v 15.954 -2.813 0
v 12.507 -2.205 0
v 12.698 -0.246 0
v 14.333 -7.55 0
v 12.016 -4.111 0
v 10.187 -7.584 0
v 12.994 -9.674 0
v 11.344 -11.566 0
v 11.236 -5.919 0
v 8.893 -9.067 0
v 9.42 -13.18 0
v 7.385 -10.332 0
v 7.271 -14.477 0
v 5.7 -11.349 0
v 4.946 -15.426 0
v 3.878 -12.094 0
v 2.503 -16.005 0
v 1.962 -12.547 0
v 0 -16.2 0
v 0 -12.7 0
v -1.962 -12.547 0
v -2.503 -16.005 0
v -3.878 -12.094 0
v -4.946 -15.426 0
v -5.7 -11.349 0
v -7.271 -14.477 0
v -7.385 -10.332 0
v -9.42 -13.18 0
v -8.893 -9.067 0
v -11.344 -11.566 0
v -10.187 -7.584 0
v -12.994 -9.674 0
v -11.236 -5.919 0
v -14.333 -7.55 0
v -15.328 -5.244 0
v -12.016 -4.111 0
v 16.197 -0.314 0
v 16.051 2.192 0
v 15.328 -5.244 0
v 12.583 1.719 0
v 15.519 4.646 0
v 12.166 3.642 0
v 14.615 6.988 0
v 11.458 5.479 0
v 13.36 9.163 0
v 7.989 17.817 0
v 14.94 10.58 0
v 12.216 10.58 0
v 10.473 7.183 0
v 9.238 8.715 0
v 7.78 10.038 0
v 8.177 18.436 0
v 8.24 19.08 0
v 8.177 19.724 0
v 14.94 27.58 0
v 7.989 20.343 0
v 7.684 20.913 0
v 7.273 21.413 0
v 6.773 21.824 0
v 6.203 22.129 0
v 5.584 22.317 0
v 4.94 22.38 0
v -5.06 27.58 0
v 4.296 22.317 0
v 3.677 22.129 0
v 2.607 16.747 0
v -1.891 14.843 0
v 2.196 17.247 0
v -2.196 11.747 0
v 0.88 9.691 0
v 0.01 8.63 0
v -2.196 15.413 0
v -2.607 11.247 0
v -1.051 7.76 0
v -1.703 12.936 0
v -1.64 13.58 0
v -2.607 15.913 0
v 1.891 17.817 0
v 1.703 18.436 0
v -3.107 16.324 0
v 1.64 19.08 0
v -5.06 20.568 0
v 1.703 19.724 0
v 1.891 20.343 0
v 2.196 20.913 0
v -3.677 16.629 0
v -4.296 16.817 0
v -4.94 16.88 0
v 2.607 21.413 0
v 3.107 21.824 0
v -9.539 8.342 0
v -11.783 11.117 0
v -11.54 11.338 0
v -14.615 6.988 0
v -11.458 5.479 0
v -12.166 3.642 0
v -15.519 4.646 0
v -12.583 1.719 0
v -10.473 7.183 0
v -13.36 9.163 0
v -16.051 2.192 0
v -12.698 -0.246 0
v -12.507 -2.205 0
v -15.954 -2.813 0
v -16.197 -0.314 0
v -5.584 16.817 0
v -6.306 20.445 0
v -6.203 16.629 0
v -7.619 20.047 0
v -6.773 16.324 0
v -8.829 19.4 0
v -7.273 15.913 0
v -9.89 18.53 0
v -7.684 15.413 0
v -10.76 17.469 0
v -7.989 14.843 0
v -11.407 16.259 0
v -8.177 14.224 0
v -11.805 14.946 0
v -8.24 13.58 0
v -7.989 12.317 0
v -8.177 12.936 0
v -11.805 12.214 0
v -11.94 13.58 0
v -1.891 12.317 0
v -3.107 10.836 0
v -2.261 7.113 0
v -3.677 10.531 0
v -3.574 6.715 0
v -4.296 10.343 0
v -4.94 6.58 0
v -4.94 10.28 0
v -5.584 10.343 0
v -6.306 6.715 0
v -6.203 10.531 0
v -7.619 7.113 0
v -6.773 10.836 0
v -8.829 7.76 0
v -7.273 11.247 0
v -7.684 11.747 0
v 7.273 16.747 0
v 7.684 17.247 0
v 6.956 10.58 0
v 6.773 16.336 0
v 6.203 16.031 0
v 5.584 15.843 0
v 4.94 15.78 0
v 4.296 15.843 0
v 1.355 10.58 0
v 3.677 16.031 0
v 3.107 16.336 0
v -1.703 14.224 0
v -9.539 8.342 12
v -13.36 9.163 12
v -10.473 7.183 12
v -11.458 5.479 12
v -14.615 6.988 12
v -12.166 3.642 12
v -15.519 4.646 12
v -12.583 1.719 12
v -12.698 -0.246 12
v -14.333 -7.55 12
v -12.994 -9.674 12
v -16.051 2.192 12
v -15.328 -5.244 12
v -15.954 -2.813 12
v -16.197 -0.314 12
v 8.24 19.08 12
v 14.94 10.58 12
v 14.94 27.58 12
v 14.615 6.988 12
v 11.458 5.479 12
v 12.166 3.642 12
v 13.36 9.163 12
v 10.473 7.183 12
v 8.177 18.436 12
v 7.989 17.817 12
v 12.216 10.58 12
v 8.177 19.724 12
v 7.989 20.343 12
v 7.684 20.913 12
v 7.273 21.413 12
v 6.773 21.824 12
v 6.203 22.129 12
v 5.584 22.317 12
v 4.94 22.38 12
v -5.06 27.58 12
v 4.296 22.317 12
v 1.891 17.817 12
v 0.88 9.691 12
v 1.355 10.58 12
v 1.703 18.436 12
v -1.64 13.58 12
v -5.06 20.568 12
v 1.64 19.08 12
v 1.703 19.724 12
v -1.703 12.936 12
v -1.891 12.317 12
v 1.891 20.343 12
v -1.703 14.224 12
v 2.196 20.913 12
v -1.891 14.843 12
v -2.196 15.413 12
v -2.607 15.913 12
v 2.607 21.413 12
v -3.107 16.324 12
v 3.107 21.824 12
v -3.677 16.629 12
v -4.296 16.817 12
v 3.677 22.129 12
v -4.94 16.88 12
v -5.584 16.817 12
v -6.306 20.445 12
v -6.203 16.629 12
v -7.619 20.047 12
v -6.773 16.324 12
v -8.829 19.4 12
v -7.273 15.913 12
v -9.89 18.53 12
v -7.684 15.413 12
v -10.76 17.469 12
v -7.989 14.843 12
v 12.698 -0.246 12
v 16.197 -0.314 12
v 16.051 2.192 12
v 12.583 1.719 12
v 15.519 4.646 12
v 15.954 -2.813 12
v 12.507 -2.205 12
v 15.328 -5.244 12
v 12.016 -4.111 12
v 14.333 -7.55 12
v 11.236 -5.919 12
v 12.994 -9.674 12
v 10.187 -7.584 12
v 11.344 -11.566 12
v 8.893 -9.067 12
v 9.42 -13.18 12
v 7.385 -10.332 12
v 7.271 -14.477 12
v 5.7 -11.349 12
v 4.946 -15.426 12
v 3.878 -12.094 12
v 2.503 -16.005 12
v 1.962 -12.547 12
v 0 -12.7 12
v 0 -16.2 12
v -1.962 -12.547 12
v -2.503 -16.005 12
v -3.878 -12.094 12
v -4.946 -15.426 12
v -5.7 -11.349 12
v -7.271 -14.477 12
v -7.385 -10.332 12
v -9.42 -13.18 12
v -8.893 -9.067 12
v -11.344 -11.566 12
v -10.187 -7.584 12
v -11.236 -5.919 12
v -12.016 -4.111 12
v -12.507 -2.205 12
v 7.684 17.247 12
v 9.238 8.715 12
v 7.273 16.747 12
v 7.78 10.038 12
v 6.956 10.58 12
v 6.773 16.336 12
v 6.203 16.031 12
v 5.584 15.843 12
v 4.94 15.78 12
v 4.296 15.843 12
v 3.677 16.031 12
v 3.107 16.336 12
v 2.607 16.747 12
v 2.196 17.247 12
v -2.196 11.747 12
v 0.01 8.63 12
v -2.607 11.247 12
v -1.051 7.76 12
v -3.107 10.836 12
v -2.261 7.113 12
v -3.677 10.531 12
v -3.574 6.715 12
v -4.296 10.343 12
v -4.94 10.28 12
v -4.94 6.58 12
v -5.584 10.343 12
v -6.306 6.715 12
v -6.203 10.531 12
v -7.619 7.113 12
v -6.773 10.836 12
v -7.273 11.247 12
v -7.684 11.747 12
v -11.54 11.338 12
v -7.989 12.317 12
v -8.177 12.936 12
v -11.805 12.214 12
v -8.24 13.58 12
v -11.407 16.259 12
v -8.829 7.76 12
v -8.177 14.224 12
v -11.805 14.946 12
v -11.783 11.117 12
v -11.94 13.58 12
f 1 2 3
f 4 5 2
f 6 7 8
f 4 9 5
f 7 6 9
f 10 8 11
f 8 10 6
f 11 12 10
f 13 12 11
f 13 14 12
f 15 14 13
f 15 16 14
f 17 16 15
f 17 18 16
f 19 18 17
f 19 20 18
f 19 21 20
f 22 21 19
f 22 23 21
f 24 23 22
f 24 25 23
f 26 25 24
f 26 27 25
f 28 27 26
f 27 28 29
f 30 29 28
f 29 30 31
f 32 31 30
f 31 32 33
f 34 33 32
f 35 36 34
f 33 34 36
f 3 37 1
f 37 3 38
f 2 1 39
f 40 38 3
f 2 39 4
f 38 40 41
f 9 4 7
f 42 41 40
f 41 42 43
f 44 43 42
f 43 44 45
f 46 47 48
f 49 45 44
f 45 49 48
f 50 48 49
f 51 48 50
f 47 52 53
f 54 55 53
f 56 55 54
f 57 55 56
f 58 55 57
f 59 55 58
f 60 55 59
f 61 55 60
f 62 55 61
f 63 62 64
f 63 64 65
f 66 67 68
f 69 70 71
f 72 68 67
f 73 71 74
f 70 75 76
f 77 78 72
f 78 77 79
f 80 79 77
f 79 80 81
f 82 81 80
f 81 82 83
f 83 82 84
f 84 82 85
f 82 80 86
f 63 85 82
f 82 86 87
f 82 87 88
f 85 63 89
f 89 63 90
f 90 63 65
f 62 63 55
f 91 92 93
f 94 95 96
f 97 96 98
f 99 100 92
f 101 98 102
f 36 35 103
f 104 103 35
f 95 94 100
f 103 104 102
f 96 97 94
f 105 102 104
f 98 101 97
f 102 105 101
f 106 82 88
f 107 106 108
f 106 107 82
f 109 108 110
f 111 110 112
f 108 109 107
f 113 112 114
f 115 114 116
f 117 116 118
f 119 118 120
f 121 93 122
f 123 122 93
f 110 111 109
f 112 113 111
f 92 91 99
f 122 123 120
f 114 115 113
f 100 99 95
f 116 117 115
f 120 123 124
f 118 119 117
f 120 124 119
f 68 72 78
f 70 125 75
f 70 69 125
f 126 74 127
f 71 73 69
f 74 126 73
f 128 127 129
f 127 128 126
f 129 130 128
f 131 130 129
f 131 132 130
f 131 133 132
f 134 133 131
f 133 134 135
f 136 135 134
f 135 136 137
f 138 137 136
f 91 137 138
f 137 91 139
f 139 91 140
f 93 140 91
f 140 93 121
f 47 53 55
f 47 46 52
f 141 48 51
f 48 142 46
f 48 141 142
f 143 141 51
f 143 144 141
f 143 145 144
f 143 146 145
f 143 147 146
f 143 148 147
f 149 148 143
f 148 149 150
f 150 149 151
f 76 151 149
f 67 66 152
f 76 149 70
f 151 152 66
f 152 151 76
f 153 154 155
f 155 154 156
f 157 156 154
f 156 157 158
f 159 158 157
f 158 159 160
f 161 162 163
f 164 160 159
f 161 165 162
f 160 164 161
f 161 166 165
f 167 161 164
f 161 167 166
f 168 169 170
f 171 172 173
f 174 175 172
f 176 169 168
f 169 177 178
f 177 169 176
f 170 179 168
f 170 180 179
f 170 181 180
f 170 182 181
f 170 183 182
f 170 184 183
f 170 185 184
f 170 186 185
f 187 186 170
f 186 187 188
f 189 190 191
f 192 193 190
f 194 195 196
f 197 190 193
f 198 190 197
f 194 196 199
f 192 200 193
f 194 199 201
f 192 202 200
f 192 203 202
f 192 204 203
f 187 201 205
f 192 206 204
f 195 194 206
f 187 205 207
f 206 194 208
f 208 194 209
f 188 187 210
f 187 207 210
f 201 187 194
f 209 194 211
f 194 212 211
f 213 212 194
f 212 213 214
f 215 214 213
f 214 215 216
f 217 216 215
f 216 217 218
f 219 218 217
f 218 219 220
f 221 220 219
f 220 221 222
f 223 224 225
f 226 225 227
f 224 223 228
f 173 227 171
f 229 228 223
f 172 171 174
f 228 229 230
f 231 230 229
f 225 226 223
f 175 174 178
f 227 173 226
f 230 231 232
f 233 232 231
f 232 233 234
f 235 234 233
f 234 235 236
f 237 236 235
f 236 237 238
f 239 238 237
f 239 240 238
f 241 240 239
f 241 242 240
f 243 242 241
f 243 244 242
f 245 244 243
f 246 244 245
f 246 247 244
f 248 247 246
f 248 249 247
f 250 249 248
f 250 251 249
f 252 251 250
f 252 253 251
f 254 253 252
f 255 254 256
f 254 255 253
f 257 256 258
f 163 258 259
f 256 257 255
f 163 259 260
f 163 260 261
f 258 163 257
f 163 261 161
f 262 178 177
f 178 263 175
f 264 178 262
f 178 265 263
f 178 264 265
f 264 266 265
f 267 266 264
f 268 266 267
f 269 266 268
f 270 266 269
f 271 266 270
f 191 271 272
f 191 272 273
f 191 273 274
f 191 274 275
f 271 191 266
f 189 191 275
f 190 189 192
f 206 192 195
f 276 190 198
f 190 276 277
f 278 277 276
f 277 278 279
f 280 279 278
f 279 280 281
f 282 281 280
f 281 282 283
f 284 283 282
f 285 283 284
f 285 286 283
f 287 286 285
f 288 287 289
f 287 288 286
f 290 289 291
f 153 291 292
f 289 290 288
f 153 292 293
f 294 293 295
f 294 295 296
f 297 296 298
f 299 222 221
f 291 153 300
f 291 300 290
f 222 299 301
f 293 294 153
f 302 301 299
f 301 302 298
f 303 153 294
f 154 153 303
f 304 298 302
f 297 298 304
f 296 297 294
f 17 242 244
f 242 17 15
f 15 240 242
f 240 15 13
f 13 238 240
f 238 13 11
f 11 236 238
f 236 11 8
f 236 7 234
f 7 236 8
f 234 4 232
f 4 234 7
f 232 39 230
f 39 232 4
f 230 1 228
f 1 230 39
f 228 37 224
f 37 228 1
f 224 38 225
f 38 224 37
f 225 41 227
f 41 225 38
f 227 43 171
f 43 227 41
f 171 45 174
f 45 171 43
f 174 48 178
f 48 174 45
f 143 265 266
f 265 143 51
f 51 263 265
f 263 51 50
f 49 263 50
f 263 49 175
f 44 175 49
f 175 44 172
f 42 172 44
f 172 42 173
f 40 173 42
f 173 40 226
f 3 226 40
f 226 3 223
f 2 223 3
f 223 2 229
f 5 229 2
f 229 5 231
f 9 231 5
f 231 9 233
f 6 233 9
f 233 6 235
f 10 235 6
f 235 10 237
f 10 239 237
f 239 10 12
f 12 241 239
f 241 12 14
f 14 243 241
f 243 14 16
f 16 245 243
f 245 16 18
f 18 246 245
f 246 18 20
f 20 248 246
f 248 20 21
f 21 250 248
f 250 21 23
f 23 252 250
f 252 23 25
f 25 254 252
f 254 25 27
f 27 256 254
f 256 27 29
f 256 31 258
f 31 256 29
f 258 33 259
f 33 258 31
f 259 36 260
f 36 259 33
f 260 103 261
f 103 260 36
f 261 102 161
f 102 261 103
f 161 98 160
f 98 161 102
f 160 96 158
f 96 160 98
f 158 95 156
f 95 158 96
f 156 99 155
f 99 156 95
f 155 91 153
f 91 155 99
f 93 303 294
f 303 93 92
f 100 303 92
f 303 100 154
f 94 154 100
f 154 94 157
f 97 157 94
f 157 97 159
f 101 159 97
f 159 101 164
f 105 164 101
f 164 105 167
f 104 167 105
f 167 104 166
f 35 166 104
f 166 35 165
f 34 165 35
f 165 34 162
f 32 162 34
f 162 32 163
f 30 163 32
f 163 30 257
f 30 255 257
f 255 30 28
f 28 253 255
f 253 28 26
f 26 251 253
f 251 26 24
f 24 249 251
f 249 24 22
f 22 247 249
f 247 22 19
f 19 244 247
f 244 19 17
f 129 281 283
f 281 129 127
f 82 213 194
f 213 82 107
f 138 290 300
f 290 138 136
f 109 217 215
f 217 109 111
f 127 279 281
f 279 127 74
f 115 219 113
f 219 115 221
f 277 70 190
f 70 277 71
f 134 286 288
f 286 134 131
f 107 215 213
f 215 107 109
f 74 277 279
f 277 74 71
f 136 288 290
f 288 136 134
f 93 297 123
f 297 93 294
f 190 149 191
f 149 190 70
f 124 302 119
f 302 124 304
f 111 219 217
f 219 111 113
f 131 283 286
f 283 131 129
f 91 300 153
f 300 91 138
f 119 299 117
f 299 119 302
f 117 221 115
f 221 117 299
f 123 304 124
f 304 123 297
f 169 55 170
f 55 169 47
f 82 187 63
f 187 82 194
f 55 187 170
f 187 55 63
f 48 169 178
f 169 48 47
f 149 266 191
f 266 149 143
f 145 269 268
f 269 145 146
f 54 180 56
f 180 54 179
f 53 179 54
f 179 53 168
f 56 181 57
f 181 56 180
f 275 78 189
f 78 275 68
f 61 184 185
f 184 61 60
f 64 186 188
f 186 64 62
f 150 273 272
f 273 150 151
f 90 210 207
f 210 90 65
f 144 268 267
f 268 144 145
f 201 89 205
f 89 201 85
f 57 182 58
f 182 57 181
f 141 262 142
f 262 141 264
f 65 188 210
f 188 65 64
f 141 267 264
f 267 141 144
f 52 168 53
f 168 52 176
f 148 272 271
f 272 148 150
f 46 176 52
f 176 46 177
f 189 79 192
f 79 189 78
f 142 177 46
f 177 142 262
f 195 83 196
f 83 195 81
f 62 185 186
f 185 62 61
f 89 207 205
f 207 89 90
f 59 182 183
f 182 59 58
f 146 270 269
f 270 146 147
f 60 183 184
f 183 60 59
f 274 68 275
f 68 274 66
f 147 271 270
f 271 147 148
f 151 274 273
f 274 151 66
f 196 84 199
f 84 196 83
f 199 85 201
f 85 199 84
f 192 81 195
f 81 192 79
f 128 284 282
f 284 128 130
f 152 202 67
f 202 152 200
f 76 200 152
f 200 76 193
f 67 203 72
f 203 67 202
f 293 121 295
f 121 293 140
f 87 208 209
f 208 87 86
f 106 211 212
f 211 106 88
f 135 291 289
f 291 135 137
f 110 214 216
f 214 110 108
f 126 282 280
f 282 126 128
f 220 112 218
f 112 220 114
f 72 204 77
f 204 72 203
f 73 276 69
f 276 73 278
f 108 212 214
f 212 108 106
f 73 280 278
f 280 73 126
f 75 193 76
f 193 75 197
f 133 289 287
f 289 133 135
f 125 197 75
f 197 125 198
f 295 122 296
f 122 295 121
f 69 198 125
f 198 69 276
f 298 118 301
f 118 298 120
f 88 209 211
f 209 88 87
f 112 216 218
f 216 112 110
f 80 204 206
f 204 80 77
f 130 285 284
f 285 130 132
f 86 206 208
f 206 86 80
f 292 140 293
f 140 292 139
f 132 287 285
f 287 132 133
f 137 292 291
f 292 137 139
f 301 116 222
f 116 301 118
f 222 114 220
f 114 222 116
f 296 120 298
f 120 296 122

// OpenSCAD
$fn = 32;

// ----------------------------------------------------------------------
// Pipe clamp: 32.4 mm ring, 3.5 mm wall, 12 mm wide
// ----------------------------------------------------------------------

// --- parameters (mm) ---
outer_r = 16.2;           // clamp outside radius
inner_r = 12.7;           // pipe bore radius
band = 3.5;               // band thickness
clamp_w = 12;             // clamp width
opening = 40;             // opening angle between the ends
lug_w = 20;               // lug width
lug_len = 17;             // lug length
bolt_d = 6.6;             // bolt hole
knuckle_d = 14;           // hinge knuckle diameter
pin_d = 6.6;              // hinge pin hole

clamp_profile = [[-5.541, 15.223], [-7.826, 14.184], [-9.924, 12.804], [-11.783, 11.117], [-13.36, 9.163], [-14.615, 6.988], [-15.519, 4.646], [-16.051, 2.192], [-16.197, -0.314], [-15.954, -2.813], [-15.328, -5.244], [-14.333, -7.55], [-12.994, -9.674], [-11.344, -11.566], [-9.42, -13.18], [-7.271, -14.477], [-4.946, -15.426], [-2.503, -16.005], [0, -16.2], [2.503, -16.005], [4.946, -15.426], [7.271, -14.477], [9.42, -13.18], [11.344, -11.566], [12.994, -9.674], [14.333, -7.55], [15.328, -5.244], [15.954, -2.813], [16.197, -0.314], [16.051, 2.192], [15.519, 4.646], [14.615, 6.988], [13.36, 9.163], [11.783, 11.117], [9.924, 12.804], [7.826, 14.184], [5.541, 15.223], [4.344, 11.934], [6.136, 11.12], [7.78, 10.038], [9.238, 8.715], [10.473, 7.183], [11.458, 5.479], [12.166, 3.642], [12.583, 1.719], [12.698, -0.246], [12.507, -2.205], [12.016, -4.111], [11.236, -5.919], [10.187, -7.584], [8.893, -9.067], [7.385, -10.332], [5.7, -11.349], [3.878, -12.094], [1.962, -12.547], [0, -12.7], [-1.962, -12.547], [-3.878, -12.094], [-5.7, -11.349], [-7.385, -10.332], [-8.893, -9.067], [-10.187, -7.584], [-11.236, -5.919], [-12.016, -4.111], [-12.507, -2.205], [-12.698, -0.246], [-12.583, 1.719], [-12.166, 3.642], [-11.458, 5.479], [-10.473, 7.183], [-9.238, 8.715], [-7.78, 10.038], [-6.136, 11.12], [-4.344, 11.934]];

difference() {
  union() {
    linear_extrude(height = clamp_w) polygon(clamp_profile);
    /* hinge knuckle, sunk 2 mm into the band end */
    translate([-4.94, 13.58, 0]) cylinder(h = clamp_w, d = knuckle_d);
    /* bolt lug on the other end */
    translate([-5.06, 10.58, 0]) cube([lug_w, 17, clamp_w]);
  }
  translate([4.94, 19.08, -2.5]) cylinder(h = clamp_w + 5, d = bolt_d);
  translate([-4.94, 13.58, -2.5]) cylinder(h = clamp_w + 5, d = pin_d);
}
